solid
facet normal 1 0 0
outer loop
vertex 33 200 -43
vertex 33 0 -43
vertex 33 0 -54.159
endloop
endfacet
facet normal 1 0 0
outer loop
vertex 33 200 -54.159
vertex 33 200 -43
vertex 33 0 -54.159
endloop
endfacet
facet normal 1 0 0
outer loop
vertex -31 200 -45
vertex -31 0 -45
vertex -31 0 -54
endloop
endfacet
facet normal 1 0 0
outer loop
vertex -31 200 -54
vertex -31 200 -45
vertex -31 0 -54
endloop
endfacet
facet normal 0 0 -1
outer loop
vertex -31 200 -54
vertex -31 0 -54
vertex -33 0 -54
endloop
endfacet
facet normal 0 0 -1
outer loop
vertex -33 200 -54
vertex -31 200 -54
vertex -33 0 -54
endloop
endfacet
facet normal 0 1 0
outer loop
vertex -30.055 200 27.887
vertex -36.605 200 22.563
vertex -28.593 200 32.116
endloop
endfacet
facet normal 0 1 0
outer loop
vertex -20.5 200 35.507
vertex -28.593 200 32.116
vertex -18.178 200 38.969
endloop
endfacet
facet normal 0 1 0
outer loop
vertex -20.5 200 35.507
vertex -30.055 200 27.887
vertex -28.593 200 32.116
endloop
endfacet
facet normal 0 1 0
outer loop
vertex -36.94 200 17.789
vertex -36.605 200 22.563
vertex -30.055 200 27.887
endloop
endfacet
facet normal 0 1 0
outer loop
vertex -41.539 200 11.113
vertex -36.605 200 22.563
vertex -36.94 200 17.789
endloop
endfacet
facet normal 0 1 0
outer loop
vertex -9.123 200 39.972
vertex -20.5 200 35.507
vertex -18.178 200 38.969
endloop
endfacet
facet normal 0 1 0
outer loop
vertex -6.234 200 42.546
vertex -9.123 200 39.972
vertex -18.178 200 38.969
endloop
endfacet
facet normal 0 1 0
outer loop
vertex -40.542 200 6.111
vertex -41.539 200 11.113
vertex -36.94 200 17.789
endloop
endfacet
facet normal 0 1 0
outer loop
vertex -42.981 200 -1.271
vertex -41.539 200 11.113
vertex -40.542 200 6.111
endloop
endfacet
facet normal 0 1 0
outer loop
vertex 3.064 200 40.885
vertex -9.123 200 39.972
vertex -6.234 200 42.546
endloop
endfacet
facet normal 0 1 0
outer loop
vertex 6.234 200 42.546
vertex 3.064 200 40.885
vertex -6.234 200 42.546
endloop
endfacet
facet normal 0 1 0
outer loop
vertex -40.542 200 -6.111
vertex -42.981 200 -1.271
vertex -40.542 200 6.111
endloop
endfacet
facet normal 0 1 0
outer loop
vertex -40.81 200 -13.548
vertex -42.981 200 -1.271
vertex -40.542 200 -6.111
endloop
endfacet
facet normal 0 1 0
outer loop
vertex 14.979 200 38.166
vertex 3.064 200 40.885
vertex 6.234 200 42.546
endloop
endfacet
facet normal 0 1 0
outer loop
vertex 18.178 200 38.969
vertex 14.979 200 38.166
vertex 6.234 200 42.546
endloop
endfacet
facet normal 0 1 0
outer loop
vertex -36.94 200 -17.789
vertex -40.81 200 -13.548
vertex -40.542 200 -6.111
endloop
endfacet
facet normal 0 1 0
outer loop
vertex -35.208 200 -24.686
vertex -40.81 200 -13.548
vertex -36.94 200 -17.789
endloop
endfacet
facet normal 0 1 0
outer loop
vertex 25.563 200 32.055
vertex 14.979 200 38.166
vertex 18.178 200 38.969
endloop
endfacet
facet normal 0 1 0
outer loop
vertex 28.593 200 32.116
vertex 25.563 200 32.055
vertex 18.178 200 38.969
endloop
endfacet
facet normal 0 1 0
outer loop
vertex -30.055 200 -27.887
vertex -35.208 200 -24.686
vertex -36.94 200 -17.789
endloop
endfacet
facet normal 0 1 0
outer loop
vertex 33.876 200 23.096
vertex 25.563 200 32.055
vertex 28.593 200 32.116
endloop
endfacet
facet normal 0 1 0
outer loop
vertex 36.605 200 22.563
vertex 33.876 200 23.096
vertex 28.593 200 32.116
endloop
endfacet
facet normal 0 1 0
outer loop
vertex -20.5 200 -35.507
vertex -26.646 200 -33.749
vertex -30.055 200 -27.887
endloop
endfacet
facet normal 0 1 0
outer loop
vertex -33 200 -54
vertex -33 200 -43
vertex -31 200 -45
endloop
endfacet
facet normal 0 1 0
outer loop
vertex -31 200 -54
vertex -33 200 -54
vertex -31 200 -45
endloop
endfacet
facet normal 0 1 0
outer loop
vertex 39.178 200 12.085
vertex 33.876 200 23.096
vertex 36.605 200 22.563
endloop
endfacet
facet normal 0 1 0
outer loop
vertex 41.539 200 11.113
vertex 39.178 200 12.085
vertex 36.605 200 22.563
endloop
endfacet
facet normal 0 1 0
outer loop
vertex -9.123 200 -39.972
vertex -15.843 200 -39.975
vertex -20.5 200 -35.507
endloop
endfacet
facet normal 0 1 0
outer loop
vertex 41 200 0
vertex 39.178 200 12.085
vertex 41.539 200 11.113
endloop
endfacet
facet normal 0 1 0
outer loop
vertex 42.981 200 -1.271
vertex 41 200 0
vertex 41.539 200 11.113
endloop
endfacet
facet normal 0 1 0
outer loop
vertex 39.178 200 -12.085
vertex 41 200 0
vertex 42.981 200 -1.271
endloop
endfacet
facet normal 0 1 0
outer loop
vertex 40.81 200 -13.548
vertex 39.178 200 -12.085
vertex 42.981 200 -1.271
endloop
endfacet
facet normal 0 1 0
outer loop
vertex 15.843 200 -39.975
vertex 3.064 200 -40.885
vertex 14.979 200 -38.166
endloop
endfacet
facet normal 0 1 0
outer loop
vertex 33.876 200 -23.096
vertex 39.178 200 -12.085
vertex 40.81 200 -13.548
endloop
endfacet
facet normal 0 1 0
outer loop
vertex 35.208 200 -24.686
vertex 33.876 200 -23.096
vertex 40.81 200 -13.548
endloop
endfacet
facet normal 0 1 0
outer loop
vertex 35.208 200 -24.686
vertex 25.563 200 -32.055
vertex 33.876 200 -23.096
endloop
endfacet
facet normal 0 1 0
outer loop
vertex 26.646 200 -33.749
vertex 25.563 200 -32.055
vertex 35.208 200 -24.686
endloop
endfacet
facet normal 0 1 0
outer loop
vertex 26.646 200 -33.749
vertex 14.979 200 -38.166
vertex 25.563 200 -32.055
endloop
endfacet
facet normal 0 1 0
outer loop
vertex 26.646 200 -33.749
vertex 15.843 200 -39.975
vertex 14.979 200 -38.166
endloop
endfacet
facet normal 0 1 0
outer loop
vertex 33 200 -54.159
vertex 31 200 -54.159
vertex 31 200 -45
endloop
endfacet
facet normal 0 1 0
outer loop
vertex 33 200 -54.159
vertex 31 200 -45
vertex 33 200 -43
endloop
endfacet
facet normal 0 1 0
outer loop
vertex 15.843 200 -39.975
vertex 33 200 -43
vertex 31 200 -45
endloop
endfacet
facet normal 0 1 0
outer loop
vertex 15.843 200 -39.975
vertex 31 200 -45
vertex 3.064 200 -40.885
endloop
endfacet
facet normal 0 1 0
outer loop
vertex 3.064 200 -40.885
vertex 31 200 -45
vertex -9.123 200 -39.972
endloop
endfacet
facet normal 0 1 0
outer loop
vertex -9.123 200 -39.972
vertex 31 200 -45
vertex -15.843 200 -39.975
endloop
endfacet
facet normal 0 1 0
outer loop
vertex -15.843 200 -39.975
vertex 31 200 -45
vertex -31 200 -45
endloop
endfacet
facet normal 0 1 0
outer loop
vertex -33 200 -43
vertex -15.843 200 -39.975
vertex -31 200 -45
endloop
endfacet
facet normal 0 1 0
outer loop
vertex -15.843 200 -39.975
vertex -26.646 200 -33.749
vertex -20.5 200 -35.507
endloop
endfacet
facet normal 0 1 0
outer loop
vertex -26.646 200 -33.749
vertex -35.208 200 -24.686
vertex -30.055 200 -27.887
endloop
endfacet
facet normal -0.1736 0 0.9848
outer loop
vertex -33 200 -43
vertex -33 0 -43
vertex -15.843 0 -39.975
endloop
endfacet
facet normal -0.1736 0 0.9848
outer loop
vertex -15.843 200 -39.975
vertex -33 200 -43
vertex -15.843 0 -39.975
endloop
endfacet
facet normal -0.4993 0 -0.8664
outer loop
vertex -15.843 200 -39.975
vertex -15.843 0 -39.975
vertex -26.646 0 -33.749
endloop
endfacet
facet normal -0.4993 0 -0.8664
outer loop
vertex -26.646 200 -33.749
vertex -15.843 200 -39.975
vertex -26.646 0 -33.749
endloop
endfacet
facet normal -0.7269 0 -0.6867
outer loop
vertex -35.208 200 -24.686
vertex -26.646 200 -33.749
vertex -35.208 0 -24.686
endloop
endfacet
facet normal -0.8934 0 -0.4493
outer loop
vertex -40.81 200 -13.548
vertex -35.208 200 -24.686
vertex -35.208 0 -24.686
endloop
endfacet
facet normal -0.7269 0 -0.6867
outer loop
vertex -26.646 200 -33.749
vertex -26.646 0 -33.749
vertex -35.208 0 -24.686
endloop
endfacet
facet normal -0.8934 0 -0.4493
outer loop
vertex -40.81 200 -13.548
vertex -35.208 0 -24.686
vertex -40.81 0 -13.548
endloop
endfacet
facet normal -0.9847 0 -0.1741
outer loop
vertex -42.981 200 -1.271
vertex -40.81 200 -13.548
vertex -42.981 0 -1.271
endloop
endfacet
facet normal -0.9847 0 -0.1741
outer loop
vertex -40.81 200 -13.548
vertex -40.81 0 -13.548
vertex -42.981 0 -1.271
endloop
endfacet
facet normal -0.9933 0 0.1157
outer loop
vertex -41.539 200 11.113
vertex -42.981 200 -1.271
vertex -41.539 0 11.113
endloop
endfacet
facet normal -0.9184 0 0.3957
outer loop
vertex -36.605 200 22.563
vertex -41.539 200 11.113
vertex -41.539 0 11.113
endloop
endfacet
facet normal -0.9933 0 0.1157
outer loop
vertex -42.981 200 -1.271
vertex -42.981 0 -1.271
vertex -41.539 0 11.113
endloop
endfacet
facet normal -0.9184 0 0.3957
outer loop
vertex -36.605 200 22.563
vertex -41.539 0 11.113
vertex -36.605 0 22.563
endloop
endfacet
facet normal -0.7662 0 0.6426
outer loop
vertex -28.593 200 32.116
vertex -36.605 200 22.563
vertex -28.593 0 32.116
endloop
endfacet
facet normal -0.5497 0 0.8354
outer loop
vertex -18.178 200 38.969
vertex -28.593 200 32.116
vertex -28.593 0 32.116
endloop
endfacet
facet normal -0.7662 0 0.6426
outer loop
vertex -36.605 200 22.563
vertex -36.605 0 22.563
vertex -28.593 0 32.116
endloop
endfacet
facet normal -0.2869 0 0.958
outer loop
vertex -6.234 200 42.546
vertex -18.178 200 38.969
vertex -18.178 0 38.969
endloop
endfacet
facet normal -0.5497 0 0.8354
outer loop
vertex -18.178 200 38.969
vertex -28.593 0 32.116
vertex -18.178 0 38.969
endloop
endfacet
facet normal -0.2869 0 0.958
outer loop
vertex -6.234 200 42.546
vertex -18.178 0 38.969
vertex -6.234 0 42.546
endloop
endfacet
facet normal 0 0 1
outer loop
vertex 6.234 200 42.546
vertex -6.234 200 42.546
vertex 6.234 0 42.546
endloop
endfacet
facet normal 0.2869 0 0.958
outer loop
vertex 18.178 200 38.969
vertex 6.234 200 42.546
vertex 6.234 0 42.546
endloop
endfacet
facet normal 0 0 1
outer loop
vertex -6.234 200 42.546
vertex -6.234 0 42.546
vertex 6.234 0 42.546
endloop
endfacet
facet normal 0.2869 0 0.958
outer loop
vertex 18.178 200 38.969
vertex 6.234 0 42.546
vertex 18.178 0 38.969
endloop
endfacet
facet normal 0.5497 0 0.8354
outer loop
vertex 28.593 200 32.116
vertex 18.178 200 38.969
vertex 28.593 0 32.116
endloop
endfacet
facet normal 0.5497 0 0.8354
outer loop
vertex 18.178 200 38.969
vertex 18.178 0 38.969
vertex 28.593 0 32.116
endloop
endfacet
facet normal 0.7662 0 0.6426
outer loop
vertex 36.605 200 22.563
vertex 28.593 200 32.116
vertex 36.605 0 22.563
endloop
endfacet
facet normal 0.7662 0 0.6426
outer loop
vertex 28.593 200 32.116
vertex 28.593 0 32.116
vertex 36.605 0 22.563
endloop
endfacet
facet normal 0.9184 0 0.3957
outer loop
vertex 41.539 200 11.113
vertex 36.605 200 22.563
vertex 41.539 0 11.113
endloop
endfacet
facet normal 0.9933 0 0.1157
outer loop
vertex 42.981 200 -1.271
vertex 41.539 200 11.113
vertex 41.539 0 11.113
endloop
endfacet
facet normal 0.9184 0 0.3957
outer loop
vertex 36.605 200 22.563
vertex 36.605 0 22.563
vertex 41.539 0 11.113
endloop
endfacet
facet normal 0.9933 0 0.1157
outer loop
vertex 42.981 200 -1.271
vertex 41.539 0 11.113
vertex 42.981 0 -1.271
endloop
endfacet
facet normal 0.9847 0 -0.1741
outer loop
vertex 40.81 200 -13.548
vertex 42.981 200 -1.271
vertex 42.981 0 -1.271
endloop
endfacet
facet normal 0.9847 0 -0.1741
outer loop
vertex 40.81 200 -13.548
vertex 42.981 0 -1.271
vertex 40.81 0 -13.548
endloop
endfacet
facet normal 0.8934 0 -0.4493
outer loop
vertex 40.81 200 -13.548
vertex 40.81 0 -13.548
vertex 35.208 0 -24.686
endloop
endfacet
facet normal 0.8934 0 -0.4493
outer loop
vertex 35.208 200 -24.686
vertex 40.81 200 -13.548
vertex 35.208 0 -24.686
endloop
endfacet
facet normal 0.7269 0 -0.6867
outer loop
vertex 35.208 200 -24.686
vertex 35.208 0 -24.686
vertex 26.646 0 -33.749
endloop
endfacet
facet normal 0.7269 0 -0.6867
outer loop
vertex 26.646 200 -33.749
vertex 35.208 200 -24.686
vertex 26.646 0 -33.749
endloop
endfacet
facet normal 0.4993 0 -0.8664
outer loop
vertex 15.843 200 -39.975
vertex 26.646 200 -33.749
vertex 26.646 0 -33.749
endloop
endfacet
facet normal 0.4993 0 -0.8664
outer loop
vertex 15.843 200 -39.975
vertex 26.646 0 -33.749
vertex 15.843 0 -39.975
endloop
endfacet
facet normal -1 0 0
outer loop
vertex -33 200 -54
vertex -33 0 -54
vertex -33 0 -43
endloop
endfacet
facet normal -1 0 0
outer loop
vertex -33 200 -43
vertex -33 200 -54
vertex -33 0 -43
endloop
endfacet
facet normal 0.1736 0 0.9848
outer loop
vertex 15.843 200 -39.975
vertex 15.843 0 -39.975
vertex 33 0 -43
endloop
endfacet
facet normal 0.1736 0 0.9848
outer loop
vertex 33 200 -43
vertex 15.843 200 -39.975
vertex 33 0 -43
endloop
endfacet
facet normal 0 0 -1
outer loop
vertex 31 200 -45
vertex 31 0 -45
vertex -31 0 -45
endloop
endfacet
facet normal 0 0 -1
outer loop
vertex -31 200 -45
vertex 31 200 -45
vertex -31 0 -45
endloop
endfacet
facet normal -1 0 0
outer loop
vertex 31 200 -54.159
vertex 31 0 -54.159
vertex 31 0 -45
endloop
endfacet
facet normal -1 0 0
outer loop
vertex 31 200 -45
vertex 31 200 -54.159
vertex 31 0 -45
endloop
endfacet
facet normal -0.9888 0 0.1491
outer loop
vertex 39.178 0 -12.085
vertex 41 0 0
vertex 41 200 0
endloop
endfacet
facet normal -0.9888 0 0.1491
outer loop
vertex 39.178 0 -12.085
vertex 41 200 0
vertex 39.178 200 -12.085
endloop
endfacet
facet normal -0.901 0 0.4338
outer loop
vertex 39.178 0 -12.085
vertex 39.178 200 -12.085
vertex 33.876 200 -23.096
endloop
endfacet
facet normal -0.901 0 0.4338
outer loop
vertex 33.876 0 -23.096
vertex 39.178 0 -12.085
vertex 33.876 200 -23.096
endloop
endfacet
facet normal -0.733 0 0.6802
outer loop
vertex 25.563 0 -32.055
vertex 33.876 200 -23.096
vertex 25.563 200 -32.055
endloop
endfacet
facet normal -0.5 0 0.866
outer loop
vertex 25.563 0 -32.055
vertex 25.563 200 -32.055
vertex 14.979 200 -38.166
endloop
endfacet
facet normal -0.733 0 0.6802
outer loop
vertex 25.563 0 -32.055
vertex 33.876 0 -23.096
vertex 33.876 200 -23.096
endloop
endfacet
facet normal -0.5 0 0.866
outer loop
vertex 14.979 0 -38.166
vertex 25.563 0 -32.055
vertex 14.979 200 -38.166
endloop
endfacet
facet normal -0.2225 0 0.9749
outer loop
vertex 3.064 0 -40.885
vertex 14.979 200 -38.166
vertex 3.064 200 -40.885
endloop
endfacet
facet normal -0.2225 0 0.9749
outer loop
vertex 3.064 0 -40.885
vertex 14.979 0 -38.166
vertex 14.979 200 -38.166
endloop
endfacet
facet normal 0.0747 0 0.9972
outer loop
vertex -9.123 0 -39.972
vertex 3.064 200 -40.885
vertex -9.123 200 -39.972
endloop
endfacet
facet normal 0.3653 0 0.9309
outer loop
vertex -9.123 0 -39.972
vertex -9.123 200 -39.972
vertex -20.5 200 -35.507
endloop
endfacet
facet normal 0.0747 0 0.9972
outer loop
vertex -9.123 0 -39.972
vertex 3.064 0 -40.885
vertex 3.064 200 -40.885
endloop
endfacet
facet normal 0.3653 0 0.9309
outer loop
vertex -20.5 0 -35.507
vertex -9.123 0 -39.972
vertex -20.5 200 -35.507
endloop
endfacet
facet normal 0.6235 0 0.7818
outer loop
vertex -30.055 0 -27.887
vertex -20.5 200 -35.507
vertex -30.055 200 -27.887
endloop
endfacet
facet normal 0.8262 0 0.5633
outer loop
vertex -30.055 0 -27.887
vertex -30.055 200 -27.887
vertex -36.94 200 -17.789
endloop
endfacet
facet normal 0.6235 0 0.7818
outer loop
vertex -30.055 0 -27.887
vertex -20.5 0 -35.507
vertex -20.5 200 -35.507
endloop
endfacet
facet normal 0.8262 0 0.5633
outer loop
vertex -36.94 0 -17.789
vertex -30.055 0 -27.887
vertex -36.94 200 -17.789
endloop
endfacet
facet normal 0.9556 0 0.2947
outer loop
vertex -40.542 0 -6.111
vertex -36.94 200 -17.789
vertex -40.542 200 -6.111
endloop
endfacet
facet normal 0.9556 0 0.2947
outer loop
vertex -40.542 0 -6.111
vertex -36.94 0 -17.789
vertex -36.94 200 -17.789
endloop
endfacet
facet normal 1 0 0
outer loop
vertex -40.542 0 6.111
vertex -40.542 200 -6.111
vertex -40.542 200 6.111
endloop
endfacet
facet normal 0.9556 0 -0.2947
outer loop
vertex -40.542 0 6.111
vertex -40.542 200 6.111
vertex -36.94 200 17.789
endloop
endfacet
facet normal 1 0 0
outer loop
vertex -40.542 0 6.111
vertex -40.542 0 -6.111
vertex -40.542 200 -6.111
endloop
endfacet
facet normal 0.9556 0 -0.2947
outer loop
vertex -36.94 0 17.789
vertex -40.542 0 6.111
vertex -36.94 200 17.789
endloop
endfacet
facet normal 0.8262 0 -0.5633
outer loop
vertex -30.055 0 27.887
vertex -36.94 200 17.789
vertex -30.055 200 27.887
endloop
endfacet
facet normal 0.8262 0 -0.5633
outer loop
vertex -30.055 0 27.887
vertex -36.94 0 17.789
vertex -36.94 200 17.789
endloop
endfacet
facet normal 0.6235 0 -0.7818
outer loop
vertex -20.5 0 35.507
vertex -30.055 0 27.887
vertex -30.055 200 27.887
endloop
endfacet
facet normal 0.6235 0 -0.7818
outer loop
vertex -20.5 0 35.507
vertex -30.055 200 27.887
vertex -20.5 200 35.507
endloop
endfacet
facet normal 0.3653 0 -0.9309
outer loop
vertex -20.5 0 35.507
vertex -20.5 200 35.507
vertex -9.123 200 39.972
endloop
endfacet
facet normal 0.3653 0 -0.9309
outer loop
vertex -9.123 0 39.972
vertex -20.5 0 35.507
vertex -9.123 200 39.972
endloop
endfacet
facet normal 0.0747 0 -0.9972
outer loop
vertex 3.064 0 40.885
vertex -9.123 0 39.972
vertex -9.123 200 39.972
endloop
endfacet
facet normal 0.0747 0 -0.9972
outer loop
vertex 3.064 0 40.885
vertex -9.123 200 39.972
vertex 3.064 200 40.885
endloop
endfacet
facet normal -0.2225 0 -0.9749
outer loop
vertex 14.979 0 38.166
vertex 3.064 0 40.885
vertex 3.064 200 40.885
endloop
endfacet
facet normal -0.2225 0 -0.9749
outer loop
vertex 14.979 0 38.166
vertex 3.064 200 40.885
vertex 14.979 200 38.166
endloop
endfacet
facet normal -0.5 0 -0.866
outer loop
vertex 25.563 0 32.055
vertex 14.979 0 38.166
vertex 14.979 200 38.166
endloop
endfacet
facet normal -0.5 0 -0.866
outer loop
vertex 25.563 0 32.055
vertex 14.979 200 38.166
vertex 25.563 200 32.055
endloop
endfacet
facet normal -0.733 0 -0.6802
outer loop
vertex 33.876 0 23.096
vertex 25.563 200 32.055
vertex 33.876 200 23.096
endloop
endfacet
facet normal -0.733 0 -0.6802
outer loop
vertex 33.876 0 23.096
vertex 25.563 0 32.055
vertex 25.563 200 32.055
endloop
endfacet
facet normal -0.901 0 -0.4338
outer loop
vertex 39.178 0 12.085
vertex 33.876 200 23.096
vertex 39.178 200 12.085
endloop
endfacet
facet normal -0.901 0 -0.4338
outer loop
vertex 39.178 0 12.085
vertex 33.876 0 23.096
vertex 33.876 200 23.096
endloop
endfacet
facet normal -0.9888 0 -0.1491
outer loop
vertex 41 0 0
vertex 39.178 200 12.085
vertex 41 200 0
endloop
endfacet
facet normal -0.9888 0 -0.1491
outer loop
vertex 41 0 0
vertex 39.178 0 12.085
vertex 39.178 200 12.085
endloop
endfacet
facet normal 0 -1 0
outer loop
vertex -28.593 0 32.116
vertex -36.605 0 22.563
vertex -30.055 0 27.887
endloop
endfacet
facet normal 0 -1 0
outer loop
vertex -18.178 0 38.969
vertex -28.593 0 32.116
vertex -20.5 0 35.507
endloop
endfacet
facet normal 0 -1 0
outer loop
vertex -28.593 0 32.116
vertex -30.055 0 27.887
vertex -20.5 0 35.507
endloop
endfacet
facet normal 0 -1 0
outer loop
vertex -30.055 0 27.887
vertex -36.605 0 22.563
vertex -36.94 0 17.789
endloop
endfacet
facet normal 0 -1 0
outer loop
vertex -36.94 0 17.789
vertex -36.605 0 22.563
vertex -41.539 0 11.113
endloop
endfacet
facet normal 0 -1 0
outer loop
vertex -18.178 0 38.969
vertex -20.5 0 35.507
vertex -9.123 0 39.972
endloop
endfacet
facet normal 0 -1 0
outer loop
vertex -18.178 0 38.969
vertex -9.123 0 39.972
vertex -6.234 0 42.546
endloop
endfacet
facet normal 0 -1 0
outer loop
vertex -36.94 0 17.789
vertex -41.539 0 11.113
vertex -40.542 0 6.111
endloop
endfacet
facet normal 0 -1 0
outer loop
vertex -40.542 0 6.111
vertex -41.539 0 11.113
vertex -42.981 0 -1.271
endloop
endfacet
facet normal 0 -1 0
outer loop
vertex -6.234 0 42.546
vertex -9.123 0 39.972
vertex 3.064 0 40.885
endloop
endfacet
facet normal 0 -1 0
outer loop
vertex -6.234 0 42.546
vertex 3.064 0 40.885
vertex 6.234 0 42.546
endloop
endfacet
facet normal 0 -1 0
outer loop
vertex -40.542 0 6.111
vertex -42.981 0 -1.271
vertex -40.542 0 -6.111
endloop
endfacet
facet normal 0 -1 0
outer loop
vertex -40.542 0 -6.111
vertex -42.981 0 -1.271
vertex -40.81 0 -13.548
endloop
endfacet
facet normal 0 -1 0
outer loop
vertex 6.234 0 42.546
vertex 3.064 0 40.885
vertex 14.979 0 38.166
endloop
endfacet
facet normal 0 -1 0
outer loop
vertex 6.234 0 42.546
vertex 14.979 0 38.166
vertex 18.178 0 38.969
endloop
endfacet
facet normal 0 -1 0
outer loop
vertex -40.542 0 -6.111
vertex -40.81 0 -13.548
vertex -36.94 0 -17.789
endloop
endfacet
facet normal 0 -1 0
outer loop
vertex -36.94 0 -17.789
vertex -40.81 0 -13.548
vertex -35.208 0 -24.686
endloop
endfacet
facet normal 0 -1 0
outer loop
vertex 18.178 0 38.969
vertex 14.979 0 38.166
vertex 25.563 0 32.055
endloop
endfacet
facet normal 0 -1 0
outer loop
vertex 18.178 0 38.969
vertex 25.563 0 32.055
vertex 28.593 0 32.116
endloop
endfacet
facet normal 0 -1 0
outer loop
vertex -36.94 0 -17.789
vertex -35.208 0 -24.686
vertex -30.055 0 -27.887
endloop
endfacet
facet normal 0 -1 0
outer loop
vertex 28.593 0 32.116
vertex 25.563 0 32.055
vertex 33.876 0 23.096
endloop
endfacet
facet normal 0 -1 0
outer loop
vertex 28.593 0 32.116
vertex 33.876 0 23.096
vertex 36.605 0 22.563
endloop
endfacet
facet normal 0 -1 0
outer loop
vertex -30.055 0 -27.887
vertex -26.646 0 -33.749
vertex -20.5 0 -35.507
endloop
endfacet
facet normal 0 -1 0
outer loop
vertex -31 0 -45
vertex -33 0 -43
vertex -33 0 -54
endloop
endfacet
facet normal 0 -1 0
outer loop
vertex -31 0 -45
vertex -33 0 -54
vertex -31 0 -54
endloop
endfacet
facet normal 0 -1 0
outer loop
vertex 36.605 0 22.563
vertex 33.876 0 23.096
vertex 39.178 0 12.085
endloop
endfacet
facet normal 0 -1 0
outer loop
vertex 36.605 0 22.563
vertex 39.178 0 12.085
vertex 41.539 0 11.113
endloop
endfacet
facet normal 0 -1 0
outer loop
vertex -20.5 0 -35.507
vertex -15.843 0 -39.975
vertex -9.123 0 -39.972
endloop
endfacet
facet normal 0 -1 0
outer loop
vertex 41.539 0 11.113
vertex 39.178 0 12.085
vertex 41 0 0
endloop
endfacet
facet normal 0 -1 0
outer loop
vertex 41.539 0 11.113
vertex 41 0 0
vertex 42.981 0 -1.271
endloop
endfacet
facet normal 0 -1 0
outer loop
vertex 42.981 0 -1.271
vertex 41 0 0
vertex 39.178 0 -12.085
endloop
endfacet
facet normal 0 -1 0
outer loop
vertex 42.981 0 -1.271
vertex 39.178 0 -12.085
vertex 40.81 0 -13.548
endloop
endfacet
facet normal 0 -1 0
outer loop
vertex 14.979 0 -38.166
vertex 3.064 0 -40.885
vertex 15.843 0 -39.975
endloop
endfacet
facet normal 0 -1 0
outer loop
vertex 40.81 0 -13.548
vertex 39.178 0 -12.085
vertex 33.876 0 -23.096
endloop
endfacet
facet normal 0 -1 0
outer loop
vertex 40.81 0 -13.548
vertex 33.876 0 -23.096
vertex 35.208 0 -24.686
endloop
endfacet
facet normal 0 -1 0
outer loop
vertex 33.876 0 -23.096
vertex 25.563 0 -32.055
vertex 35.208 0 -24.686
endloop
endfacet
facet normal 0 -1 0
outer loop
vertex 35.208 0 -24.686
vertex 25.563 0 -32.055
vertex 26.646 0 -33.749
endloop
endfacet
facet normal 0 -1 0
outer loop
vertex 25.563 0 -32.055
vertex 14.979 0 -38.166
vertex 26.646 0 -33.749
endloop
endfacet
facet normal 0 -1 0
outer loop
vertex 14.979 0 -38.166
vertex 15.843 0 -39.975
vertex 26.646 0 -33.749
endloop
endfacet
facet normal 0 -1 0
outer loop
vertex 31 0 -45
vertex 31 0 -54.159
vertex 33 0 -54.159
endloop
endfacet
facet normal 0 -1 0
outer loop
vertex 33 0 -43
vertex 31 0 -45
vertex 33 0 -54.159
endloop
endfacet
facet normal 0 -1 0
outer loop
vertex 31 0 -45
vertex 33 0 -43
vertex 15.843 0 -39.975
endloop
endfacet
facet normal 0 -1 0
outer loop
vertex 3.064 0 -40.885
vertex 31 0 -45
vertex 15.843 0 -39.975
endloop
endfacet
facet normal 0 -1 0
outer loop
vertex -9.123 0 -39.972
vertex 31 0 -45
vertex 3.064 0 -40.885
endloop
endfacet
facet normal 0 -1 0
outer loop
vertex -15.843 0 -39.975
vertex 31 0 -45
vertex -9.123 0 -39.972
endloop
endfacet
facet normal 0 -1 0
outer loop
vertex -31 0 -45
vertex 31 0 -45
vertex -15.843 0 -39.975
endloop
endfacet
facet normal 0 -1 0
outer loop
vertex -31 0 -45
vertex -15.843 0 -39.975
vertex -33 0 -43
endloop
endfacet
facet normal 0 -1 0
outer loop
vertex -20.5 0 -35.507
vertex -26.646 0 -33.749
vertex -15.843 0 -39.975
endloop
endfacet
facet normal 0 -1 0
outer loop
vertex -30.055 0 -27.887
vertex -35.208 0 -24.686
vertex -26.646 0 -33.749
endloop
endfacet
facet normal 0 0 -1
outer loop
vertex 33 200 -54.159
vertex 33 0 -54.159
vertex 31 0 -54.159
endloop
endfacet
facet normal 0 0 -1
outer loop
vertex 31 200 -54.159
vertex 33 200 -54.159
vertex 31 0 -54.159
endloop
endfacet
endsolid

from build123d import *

# Parameters (mm, degrees)
SKETCH3_R           = 43
SKETCH3_R_2         = 41
BOSS_EXTRUDE1_DEPTH = 200


with BuildPart() as part:
    # Sketch3 → Boss-Extrude1 (new body)
    with BuildSketch(Plane(origin=(0, 0, 0), x_dir=(1, 0, 0), z_dir=(0, 1, 0))):
        with BuildLine():
            Line((15.84339478, 39.974827602), (33, 43))
            Line((33, 43), (33, 54.159072389))
            Line((33, 54.159072389), (31, 54.159072389))
            Line((31, 54.159072389), (31, 45))
            Line((31, 45), (-31, 45))
            Line((-31, 45), (-31, 54))
            Line((-31, 54), (-33, 54))
            Line((-33, 54), (-33, 43))
            Line((-33, 43), (-15.84339478, 39.974827602))
            ThreePointArc((-15.84339478, 39.974827602), (0, 43), (15.84339478, 39.974827602))
        make_face()
        Circle(SKETCH3_R)
        Circle(SKETCH3_R_2, mode=Mode.SUBTRACT)
    extrude(amount=BOSS_EXTRUDE1_DEPTH)


solid = part.part
